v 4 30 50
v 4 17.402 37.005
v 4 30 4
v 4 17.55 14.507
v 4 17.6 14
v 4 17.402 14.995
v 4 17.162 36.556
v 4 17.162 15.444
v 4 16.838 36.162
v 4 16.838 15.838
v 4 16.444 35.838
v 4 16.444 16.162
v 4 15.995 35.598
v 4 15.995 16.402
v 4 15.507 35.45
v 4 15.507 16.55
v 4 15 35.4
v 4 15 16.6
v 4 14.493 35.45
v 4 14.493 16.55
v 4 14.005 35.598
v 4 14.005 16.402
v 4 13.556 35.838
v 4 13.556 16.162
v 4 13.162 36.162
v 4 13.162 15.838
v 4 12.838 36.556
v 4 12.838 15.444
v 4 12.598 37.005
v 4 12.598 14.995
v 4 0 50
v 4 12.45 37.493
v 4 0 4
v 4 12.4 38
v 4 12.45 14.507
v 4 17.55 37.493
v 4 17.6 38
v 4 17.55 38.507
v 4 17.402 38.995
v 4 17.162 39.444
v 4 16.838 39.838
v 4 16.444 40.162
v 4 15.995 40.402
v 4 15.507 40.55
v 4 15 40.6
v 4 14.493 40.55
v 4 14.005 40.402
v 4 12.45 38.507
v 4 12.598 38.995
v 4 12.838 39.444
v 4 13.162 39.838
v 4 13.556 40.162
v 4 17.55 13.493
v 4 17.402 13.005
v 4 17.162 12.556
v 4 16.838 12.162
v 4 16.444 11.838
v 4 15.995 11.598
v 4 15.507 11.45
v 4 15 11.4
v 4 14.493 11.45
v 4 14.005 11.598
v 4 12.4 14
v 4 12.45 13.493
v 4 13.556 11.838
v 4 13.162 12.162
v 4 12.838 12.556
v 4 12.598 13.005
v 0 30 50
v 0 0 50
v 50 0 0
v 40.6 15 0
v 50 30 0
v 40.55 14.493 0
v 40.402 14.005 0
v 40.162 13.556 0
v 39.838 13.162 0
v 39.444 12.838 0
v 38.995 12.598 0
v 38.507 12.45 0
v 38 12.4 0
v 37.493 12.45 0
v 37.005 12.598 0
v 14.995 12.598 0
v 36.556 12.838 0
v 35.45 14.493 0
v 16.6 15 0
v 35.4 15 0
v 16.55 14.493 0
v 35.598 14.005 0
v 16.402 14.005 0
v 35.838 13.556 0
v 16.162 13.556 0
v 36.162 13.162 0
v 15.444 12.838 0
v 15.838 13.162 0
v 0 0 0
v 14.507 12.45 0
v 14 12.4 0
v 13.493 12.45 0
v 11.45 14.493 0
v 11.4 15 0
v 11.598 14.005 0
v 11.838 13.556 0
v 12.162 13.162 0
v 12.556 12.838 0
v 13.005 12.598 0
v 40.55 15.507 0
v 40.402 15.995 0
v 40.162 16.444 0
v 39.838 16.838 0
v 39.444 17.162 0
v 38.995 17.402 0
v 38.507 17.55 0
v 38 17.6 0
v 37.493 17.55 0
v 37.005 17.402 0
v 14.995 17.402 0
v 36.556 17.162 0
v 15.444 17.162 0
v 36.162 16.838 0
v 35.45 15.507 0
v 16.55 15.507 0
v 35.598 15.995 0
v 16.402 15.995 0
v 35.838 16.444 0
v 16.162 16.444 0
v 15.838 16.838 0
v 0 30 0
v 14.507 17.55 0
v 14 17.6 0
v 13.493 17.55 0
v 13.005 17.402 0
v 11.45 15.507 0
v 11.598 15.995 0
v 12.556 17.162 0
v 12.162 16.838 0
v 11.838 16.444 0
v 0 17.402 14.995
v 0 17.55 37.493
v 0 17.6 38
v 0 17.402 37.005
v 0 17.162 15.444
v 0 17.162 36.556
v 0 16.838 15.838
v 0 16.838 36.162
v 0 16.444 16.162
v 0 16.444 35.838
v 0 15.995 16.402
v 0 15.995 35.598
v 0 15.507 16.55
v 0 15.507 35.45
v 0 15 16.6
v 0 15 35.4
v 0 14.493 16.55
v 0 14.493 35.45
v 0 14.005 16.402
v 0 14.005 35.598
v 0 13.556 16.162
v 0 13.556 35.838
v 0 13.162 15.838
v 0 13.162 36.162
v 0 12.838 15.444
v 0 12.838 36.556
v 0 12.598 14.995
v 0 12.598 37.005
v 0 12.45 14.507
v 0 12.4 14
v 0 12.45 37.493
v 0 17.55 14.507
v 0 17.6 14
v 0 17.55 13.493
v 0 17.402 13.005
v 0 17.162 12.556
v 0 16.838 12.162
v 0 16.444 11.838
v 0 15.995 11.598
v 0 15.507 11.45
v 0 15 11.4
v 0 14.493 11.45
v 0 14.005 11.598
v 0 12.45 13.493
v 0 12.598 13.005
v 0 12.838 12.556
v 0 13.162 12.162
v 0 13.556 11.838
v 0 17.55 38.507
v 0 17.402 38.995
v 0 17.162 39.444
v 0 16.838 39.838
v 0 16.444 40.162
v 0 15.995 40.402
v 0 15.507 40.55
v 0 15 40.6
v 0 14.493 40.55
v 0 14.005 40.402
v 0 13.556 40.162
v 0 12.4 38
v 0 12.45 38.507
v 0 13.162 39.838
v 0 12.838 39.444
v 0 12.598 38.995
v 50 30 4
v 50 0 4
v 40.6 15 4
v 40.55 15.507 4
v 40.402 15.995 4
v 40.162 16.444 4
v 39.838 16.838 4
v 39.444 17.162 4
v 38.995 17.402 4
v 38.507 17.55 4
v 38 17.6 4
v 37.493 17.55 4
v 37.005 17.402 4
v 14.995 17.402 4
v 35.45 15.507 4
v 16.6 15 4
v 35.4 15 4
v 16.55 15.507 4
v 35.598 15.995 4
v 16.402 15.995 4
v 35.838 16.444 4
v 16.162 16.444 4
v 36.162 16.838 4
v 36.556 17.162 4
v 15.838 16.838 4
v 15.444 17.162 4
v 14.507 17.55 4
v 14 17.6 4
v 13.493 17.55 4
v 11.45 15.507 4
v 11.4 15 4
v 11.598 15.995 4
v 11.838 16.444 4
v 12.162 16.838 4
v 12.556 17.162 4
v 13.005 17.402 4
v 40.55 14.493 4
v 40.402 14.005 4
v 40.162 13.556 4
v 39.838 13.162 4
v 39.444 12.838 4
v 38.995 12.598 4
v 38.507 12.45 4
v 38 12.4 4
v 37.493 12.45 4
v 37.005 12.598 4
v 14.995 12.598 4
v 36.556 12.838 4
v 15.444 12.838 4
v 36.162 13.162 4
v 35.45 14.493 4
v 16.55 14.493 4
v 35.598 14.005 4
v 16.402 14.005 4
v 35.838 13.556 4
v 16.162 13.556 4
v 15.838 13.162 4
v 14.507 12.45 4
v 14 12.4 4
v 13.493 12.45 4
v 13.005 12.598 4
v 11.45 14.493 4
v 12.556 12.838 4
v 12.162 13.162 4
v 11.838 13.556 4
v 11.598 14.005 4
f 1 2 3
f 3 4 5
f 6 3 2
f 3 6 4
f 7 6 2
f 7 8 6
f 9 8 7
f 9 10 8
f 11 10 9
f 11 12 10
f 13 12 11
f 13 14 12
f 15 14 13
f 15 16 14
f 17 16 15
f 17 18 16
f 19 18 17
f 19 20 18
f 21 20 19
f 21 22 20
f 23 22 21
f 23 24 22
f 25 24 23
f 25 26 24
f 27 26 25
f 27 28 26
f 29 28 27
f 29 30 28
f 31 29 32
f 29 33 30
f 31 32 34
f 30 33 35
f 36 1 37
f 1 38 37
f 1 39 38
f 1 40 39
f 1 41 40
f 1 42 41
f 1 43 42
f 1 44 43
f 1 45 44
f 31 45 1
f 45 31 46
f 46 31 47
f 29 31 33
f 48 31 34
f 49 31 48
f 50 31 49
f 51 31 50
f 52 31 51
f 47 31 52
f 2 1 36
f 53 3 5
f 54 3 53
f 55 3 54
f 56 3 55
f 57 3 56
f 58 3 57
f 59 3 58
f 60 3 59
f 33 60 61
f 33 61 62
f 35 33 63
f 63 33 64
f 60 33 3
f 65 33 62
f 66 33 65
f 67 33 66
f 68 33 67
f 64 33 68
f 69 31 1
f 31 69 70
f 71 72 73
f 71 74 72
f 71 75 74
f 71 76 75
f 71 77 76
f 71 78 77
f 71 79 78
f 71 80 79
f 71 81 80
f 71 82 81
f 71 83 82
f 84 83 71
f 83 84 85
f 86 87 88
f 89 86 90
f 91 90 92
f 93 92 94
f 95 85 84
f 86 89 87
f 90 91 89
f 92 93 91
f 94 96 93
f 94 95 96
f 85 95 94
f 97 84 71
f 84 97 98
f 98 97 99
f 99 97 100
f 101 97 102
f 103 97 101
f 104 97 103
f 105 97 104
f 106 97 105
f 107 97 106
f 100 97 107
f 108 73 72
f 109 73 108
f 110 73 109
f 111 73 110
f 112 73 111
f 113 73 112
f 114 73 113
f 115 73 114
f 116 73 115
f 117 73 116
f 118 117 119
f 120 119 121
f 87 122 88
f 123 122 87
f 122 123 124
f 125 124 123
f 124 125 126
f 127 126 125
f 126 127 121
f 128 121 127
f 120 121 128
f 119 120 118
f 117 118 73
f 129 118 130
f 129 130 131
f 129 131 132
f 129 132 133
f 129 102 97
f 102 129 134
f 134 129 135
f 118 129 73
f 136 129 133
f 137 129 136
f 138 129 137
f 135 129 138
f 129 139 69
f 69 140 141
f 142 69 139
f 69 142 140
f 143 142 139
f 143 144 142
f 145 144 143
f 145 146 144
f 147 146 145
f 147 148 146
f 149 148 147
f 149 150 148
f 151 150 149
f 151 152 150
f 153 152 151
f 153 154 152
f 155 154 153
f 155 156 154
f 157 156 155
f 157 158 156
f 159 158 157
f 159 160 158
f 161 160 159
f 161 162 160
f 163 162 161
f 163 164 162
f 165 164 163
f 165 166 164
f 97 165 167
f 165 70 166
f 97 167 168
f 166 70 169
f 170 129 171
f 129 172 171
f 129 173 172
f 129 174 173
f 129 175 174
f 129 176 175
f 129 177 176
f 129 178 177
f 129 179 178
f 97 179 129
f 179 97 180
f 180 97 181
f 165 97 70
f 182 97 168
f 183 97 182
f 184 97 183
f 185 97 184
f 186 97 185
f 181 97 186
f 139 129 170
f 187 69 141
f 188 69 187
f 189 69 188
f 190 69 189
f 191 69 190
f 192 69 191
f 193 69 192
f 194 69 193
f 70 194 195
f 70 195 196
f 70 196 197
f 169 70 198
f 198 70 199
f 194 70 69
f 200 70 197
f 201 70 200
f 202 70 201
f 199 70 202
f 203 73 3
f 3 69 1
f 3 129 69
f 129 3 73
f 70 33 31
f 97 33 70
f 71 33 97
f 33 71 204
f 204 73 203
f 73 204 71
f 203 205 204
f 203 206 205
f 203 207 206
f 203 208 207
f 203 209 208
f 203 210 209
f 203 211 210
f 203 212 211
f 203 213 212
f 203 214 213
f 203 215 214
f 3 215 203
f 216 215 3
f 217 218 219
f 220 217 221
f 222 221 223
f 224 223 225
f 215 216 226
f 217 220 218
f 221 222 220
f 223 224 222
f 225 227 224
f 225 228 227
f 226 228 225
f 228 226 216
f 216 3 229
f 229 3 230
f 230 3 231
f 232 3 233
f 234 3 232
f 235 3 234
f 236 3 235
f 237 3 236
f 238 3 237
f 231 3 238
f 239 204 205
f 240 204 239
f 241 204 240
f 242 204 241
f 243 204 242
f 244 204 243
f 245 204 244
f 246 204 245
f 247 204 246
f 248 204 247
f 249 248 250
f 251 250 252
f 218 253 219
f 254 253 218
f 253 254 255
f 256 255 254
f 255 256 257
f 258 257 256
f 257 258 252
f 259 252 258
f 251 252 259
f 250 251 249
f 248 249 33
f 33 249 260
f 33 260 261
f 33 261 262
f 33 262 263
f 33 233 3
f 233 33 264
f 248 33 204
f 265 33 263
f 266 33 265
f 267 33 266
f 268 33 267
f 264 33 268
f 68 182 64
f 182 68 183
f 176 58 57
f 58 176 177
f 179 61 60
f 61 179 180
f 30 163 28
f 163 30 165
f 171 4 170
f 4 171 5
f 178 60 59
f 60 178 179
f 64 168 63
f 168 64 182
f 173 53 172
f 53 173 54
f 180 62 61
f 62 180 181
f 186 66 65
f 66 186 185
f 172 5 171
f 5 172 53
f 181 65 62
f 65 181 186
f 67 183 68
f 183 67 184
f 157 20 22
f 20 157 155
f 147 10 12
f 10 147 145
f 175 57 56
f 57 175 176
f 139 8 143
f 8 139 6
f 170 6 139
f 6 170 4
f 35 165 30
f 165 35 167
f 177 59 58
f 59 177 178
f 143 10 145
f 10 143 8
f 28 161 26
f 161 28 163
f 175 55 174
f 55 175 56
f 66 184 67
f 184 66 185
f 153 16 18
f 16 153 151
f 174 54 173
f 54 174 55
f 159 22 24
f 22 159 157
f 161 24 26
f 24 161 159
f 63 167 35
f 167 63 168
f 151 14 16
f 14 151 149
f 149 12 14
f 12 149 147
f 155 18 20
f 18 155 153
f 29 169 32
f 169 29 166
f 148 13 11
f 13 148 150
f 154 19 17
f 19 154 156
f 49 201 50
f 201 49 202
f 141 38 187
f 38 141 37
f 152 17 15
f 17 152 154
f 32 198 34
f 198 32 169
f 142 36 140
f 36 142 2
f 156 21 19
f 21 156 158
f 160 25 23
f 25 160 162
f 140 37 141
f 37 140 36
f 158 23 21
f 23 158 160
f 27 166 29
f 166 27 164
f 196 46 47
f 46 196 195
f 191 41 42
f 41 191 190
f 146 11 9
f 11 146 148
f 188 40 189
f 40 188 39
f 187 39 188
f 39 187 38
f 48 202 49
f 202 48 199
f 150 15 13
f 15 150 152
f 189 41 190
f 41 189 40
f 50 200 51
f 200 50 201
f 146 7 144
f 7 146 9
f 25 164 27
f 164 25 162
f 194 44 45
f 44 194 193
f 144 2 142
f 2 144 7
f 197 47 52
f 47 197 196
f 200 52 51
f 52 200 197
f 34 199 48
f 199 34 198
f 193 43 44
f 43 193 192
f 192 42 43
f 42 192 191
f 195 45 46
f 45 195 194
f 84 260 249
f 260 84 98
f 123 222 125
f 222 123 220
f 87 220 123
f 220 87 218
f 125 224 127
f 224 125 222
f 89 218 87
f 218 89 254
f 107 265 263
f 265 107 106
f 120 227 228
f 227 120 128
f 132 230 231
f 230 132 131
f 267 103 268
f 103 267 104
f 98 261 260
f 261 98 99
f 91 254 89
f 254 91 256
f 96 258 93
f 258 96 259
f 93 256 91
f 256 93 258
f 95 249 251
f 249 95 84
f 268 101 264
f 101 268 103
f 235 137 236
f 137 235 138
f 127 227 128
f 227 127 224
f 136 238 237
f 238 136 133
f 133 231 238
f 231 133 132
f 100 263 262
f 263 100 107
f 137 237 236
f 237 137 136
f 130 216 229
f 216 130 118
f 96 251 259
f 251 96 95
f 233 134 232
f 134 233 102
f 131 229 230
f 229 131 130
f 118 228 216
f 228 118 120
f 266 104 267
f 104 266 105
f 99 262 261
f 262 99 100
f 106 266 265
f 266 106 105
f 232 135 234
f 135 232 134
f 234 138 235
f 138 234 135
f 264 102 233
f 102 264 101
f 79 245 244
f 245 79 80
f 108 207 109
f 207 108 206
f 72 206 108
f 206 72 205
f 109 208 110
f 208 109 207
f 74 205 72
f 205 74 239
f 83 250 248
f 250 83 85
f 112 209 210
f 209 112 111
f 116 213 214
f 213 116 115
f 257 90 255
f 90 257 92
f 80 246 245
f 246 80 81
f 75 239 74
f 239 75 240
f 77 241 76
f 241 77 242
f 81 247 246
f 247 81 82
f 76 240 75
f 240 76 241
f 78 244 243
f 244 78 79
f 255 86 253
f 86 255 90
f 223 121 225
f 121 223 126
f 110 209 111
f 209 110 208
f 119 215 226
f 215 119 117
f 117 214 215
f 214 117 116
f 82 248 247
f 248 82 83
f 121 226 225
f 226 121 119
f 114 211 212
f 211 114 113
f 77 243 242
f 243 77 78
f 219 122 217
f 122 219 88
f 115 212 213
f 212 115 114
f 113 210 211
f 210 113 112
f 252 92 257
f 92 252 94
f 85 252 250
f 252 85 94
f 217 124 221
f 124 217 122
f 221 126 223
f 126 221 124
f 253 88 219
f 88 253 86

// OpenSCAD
// bracket.scad — an L-shaped shelf bracket: one flat leg
// for the wall, one for the shelf, two bolt holes in each.
// Built as two slabs joined by union(), then holed.

/* [Bracket] */
// Length of each leg
leg = 50;            // [30:90]
// Width of the bracket (into the page, y)
width = 30;          // [20:50]
// Slab thickness
thick = 4;           // [3:6]
// Bolt hole radius
hole_r = 2.6;        // [2:0.2:4]

/* [Hidden] */
$fn = 32;

difference() {
    union() {
        // Vertical leg (stands in the x-z plane).
        cube([thick, width, leg]);
        // Horizontal leg (lies in the x-y plane).
        cube([leg, width, thick]);
    }
    // Two holes through the vertical leg.
    for (z = [14, leg - 12])
        translate([-1, width / 2, z])
            rotate([0, 90, 0])
                cylinder(h = thick + 2, r = hole_r);
    // Two holes through the horizontal leg.
    for (x = [14, leg - 12])
        translate([x, width / 2, -1])
            cylinder(h = thick + 2, r = hole_r);
}
